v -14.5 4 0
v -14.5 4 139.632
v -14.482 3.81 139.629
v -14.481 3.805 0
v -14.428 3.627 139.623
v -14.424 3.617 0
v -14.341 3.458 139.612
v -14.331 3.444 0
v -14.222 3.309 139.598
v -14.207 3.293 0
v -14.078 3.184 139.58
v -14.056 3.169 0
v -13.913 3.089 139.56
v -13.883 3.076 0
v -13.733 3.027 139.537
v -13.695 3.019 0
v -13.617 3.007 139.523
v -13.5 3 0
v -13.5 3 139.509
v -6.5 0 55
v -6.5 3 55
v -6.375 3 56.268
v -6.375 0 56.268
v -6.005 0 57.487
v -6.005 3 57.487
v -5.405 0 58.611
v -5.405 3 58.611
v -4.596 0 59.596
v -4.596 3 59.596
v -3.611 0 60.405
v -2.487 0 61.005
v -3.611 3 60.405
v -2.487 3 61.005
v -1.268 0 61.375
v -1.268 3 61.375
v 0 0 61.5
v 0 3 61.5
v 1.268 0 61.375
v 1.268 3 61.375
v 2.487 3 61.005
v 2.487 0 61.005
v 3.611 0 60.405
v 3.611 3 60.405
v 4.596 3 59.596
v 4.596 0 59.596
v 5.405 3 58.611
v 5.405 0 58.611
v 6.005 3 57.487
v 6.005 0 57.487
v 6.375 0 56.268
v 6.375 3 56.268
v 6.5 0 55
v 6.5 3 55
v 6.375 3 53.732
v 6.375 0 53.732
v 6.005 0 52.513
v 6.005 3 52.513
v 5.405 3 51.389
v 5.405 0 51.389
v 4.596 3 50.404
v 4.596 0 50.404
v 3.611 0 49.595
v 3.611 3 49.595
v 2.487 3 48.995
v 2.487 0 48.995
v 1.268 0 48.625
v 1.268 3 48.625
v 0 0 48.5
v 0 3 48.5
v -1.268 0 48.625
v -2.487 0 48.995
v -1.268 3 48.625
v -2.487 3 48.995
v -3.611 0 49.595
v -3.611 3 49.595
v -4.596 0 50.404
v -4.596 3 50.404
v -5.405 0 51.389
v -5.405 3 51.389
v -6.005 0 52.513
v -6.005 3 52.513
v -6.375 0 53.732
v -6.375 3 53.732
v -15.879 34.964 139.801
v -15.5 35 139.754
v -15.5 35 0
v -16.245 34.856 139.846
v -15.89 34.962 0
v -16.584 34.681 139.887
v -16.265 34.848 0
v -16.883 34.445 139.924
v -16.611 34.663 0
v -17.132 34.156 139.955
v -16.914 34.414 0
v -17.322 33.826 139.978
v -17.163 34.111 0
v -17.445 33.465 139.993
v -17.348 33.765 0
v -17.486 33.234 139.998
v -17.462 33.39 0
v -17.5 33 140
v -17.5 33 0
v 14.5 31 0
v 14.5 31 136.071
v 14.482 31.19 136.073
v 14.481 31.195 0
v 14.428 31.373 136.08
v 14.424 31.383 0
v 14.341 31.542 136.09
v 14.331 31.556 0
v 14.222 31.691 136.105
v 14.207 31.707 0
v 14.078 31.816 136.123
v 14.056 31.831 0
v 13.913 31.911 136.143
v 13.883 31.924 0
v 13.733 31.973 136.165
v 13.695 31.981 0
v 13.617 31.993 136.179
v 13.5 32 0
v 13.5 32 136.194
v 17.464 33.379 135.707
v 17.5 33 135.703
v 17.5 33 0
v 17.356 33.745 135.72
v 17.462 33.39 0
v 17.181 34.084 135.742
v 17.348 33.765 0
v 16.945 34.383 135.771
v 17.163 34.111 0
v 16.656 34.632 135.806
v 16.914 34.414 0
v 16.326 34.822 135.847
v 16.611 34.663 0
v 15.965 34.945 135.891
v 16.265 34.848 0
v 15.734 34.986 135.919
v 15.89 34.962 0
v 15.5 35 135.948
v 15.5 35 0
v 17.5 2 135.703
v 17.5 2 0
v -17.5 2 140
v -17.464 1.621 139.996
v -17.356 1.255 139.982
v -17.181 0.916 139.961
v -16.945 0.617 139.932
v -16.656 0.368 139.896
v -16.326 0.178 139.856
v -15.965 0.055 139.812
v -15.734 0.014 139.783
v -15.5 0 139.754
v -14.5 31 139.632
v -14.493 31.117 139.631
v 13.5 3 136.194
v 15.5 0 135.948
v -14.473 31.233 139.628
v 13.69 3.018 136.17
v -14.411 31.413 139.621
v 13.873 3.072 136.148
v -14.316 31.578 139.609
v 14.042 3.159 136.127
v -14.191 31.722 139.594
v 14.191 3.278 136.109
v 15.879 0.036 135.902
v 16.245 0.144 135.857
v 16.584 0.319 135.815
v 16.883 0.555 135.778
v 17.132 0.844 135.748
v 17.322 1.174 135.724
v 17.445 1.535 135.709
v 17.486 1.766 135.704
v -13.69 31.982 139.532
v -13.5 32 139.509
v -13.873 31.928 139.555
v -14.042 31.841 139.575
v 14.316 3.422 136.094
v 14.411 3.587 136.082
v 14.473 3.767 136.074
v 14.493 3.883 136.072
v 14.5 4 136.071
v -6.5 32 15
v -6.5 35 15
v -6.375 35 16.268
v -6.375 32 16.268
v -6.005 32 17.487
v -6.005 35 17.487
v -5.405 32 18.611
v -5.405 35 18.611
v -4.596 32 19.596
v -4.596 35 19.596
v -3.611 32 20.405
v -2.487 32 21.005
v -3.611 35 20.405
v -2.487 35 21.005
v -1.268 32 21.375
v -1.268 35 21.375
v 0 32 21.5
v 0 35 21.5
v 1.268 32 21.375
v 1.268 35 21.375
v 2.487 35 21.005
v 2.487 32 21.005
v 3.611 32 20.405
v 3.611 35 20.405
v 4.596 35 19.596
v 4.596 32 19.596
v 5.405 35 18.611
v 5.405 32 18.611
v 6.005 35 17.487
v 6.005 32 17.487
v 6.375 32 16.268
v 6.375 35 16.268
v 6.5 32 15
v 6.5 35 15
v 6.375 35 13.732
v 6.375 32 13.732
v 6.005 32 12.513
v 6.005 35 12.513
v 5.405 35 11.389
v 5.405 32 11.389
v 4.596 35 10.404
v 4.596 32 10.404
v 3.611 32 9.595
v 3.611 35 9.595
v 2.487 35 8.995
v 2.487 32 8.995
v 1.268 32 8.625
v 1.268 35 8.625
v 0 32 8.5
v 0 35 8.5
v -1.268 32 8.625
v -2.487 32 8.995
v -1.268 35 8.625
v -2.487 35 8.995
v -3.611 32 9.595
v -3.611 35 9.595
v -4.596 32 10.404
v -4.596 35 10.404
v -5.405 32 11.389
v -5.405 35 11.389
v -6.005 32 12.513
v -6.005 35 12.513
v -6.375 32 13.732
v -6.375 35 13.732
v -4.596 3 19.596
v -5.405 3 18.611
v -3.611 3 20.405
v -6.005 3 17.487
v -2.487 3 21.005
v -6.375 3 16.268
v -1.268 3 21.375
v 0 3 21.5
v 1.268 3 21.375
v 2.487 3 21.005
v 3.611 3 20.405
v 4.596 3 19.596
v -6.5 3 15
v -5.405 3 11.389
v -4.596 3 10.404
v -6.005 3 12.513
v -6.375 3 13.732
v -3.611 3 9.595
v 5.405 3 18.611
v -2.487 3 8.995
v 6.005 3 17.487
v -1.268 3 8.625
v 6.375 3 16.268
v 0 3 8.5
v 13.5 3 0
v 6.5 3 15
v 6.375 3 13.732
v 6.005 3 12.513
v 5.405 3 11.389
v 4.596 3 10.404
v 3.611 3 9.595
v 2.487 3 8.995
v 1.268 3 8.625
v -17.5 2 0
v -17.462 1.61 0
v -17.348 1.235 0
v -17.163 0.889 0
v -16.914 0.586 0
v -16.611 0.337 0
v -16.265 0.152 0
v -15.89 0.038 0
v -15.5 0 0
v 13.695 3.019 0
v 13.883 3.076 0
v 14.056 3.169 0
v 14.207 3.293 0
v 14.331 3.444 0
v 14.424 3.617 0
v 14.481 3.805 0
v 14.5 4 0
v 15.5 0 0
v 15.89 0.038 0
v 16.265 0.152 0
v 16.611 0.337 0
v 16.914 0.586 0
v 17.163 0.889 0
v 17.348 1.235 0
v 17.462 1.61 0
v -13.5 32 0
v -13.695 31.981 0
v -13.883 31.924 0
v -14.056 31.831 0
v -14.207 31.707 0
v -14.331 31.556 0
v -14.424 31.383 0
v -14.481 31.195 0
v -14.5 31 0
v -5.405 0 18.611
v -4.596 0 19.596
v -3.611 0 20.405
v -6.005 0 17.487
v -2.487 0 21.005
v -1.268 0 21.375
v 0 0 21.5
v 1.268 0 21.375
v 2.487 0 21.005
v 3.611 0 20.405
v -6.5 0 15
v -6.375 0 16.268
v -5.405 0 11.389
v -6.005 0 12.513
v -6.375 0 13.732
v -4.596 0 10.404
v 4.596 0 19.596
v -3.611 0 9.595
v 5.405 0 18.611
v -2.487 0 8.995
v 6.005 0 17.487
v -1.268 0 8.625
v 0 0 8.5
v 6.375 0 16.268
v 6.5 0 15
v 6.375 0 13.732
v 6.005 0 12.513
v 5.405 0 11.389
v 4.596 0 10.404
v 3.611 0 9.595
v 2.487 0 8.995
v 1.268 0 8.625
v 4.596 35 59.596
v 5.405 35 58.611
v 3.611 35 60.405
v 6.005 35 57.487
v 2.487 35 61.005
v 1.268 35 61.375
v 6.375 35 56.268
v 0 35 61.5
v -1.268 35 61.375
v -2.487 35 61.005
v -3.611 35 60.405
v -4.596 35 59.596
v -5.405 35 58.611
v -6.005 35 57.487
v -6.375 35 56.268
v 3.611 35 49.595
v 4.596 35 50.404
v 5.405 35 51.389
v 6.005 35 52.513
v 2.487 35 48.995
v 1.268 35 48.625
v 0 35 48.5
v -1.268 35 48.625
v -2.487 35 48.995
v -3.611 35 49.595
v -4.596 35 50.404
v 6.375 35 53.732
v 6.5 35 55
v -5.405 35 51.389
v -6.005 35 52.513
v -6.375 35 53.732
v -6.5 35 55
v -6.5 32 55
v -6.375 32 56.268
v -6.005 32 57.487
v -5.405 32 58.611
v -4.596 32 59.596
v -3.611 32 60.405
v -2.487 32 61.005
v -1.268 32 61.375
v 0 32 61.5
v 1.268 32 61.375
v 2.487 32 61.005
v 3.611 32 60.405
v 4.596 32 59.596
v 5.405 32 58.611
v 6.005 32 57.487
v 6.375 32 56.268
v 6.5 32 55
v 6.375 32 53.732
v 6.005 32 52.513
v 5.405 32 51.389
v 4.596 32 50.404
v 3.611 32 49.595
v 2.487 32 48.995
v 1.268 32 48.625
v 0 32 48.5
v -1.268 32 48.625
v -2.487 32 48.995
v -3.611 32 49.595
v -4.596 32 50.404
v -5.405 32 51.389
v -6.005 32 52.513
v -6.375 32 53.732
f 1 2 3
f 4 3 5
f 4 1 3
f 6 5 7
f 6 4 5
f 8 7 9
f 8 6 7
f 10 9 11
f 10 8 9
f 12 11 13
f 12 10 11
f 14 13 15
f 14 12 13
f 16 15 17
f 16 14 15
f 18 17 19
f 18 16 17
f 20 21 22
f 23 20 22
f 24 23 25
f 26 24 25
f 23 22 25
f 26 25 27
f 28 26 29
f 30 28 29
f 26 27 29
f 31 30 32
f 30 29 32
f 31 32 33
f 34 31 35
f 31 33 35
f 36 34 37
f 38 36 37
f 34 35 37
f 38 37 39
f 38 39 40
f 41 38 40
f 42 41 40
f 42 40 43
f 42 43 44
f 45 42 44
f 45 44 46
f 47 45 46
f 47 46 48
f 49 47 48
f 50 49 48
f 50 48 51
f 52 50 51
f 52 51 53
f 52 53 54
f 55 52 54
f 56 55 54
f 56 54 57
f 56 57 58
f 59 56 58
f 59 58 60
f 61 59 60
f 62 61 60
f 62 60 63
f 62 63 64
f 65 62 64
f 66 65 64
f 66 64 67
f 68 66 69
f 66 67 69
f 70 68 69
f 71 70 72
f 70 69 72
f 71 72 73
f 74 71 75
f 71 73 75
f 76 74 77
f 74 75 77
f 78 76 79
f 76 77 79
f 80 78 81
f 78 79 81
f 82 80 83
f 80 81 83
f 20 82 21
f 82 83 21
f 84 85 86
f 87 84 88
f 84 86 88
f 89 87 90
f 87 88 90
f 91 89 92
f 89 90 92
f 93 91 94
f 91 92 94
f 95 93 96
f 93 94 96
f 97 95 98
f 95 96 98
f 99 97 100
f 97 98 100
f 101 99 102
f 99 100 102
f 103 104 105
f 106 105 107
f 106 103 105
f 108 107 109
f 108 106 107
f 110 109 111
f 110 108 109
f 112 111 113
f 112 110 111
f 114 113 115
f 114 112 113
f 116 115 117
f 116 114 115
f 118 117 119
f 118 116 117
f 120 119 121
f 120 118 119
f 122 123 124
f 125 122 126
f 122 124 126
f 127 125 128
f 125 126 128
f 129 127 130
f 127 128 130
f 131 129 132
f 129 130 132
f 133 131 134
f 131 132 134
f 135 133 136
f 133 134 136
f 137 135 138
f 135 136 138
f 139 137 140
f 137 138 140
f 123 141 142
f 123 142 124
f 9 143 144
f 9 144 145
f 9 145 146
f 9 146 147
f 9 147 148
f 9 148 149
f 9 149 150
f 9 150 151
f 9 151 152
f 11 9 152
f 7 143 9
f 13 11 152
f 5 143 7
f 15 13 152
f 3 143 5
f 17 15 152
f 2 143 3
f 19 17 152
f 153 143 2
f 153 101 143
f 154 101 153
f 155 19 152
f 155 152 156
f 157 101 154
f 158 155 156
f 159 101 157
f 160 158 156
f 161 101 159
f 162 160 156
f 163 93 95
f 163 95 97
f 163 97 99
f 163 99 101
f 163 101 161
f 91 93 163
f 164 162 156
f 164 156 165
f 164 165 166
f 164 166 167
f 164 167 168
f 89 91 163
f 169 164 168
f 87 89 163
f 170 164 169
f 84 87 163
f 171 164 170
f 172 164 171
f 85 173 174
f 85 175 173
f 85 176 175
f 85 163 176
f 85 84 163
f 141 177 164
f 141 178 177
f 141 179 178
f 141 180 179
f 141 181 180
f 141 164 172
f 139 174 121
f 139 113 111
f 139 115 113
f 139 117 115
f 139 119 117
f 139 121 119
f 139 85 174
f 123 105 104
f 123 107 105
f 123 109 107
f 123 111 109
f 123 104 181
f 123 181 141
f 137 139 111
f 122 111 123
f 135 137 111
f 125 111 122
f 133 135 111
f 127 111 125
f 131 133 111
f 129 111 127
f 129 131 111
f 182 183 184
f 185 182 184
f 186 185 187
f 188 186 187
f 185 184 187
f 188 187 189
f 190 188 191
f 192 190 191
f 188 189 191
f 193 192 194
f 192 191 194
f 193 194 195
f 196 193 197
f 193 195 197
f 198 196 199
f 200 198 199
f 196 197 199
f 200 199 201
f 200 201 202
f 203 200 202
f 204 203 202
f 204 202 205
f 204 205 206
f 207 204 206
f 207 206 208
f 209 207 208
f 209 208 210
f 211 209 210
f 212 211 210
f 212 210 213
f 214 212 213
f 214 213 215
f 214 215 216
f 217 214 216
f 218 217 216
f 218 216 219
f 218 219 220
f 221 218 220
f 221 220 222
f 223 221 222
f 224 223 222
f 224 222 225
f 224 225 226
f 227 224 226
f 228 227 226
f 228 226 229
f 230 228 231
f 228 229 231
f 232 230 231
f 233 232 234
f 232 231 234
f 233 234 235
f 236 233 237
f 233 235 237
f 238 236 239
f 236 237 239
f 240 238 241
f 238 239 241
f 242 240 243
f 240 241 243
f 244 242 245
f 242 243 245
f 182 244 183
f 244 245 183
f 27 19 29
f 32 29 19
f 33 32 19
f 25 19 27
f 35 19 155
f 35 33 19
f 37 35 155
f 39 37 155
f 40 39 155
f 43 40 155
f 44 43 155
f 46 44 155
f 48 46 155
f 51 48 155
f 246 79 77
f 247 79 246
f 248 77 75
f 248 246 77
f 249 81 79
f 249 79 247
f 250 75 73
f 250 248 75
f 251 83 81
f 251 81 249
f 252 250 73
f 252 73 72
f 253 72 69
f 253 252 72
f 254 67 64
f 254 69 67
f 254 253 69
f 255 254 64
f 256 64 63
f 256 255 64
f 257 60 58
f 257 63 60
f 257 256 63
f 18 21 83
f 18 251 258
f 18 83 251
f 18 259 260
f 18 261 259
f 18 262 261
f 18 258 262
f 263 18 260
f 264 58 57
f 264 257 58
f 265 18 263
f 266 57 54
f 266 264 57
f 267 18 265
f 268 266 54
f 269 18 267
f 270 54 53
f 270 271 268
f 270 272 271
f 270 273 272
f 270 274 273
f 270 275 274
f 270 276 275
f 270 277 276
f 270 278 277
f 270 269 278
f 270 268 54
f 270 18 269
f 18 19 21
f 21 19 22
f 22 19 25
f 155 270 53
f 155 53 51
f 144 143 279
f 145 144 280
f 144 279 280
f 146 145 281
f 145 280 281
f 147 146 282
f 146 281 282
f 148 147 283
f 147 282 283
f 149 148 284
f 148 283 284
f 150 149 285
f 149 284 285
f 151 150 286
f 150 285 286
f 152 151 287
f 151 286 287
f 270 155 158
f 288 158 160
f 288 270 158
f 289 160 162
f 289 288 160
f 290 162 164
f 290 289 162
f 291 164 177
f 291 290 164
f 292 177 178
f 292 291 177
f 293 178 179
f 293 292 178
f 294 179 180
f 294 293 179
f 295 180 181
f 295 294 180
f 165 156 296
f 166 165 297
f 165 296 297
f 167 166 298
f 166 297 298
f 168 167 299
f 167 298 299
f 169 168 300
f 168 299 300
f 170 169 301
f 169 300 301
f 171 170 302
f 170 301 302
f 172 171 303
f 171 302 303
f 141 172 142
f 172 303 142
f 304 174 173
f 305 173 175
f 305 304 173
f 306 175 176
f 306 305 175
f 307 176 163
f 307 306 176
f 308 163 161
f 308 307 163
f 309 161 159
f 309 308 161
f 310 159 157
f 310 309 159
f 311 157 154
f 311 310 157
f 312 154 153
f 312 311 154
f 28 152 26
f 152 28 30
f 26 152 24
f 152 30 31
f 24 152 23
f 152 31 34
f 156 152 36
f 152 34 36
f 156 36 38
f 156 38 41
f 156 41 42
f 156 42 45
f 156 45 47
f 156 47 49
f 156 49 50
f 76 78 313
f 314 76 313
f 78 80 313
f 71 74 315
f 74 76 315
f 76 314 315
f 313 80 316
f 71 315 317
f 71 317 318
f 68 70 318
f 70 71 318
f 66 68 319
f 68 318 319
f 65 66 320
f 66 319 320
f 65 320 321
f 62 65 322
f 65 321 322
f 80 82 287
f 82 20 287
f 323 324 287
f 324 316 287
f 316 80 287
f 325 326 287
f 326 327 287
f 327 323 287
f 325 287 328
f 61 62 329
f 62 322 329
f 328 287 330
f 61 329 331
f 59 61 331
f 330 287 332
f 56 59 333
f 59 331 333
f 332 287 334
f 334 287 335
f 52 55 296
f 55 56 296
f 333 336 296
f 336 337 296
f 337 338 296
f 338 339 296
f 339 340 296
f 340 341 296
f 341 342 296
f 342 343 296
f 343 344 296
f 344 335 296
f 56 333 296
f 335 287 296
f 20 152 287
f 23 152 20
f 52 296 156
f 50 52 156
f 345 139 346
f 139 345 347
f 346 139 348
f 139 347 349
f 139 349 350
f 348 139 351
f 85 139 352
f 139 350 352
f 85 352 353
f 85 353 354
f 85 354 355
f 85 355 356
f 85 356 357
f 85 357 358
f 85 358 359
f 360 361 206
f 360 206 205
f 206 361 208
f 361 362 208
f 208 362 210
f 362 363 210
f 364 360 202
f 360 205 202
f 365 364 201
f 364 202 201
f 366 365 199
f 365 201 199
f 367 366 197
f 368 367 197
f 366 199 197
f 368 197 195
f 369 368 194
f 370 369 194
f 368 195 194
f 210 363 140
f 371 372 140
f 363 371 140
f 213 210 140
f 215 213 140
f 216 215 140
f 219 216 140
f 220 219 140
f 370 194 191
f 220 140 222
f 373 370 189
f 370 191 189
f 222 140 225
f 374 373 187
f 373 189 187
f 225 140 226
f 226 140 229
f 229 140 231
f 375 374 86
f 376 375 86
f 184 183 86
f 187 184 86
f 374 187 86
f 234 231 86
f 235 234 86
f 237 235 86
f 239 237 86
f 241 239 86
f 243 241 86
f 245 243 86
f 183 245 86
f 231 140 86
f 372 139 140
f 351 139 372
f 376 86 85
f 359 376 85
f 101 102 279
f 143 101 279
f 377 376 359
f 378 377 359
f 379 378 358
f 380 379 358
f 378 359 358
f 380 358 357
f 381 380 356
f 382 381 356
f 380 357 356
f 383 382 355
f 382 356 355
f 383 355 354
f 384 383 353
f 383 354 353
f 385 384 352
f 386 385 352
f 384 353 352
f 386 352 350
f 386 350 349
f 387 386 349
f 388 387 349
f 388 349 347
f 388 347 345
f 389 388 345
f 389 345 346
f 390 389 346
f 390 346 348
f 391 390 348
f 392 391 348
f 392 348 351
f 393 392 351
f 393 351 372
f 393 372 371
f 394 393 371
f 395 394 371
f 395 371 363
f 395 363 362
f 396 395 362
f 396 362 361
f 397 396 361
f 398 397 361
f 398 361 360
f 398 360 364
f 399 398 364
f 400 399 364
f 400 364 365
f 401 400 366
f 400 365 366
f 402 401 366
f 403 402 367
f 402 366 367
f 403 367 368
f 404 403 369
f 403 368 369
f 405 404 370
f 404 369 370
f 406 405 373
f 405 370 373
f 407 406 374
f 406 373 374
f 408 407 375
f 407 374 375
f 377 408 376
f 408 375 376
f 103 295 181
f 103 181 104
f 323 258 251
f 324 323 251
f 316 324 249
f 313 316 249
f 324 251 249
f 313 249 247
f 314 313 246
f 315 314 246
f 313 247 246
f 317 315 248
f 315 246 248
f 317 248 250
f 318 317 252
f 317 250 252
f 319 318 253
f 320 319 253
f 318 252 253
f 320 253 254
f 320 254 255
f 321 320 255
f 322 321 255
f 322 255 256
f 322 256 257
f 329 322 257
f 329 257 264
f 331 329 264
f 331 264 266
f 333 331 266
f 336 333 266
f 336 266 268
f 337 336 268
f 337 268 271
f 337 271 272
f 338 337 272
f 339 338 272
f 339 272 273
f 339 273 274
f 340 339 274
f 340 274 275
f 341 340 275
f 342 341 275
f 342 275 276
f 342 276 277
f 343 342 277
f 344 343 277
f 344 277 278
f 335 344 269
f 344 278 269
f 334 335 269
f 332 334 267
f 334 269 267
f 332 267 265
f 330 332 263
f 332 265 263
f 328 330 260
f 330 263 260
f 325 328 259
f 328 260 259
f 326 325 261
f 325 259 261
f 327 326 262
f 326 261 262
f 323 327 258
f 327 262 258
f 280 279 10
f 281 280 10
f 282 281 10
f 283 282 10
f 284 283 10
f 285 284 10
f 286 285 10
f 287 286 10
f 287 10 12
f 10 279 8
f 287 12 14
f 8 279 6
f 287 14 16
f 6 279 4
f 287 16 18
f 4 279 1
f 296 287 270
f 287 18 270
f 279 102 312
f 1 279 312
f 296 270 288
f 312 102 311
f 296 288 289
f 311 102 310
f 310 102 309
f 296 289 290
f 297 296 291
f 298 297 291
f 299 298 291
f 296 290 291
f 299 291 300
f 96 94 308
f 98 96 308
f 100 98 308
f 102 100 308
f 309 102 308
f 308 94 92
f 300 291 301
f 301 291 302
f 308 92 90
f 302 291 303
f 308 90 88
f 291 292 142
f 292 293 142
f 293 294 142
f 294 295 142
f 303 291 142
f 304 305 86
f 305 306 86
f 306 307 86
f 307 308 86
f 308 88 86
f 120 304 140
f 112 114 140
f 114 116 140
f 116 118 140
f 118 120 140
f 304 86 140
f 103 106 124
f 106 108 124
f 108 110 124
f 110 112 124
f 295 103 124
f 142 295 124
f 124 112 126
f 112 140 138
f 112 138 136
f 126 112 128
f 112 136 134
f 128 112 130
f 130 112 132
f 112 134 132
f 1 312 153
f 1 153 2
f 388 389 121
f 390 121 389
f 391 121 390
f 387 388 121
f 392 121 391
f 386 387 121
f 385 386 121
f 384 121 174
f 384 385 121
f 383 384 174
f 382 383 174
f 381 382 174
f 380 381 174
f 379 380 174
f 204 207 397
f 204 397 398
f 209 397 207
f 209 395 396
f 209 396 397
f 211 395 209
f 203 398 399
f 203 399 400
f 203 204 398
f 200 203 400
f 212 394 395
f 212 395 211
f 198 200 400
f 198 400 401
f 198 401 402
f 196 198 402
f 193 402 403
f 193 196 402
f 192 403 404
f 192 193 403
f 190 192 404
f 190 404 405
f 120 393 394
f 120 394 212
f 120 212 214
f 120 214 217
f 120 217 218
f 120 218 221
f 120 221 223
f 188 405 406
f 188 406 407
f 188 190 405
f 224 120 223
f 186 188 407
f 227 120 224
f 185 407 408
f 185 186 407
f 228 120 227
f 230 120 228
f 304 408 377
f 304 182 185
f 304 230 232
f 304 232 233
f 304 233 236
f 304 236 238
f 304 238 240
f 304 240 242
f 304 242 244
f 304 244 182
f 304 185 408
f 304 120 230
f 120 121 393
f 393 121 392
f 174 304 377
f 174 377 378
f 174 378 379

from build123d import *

# Parameters (mm, degrees)
DODANIE_WYCI_GNI_CIE1_DEPTH = 140
SZKIC2_R                    = 6.5
WYTNIJ_WYCI_GNI_CIE1_DEPTH  = 140


with BuildPart() as part:
    # Szkic1 → Dodanie-wyciągnięcie1 (new body)
    with BuildSketch(Plane.XY):
        with BuildLine():
            Line((-15.5, 0), (15.5, 0))
            ThreePointArc((15.5, 0), (16.914213562, 0.585786438), (17.5, 2))
            Line((17.5, 2), (17.5, 33))
            ThreePointArc((17.5, 33), (16.914213562, 34.414213562), (15.5, 35))
            Line((15.5, 35), (-15.5, 35))
            ThreePointArc((-15.5, 35), (-16.914213562, 34.414213562), (-17.5, 33))
            Line((-17.5, 33), (-17.5, 2))
            ThreePointArc((-17.5, 2), (-16.914213562, 0.585786438), (-15.5, 0))
        make_face()
        with BuildLine():
            Line((-13.5, 3), (13.5, 3))
            ThreePointArc((13.5, 3), (14.207106781, 3.292893219), (14.5, 4))
            Line((14.5, 4), (14.5, 31))
            ThreePointArc((14.5, 31), (14.207106781, 31.707106781), (13.5, 32))
            Line((13.5, 32), (-13.5, 32))
            ThreePointArc((-13.5, 32), (-14.207106781, 31.707106781), (-14.5, 31))
            Line((-14.5, 31), (-14.5, 4))
            ThreePointArc((-14.5, 4), (-14.207106781, 3.292893219), (-13.5, 3))
        make_face(mode=Mode.SUBTRACT)
    extrude(amount=DODANIE_WYCI_GNI_CIE1_DEPTH)

    # Szkic2 → Wytnij-wyciągnięcie1 (cut)
    with BuildSketch(Plane(origin=(0, 35, 0), x_dir=(1, 0, 0), z_dir=(0, 1, 0))):
        with Locations(Location((0, -15, 0), (0, 0, 180))):
            Circle(SZKIC2_R)
        with Locations(Location((0, -55, 0), (0, 0, 180))):
            Circle(SZKIC2_R)
        Polygon((-17.5, -140), (23.891746827, -134.917732541), (23.891746827, -140), align=None)
    extrude(amount=-WYTNIJ_WYCI_GNI_CIE1_DEPTH, mode=Mode.SUBTRACT)


solid = part.part
